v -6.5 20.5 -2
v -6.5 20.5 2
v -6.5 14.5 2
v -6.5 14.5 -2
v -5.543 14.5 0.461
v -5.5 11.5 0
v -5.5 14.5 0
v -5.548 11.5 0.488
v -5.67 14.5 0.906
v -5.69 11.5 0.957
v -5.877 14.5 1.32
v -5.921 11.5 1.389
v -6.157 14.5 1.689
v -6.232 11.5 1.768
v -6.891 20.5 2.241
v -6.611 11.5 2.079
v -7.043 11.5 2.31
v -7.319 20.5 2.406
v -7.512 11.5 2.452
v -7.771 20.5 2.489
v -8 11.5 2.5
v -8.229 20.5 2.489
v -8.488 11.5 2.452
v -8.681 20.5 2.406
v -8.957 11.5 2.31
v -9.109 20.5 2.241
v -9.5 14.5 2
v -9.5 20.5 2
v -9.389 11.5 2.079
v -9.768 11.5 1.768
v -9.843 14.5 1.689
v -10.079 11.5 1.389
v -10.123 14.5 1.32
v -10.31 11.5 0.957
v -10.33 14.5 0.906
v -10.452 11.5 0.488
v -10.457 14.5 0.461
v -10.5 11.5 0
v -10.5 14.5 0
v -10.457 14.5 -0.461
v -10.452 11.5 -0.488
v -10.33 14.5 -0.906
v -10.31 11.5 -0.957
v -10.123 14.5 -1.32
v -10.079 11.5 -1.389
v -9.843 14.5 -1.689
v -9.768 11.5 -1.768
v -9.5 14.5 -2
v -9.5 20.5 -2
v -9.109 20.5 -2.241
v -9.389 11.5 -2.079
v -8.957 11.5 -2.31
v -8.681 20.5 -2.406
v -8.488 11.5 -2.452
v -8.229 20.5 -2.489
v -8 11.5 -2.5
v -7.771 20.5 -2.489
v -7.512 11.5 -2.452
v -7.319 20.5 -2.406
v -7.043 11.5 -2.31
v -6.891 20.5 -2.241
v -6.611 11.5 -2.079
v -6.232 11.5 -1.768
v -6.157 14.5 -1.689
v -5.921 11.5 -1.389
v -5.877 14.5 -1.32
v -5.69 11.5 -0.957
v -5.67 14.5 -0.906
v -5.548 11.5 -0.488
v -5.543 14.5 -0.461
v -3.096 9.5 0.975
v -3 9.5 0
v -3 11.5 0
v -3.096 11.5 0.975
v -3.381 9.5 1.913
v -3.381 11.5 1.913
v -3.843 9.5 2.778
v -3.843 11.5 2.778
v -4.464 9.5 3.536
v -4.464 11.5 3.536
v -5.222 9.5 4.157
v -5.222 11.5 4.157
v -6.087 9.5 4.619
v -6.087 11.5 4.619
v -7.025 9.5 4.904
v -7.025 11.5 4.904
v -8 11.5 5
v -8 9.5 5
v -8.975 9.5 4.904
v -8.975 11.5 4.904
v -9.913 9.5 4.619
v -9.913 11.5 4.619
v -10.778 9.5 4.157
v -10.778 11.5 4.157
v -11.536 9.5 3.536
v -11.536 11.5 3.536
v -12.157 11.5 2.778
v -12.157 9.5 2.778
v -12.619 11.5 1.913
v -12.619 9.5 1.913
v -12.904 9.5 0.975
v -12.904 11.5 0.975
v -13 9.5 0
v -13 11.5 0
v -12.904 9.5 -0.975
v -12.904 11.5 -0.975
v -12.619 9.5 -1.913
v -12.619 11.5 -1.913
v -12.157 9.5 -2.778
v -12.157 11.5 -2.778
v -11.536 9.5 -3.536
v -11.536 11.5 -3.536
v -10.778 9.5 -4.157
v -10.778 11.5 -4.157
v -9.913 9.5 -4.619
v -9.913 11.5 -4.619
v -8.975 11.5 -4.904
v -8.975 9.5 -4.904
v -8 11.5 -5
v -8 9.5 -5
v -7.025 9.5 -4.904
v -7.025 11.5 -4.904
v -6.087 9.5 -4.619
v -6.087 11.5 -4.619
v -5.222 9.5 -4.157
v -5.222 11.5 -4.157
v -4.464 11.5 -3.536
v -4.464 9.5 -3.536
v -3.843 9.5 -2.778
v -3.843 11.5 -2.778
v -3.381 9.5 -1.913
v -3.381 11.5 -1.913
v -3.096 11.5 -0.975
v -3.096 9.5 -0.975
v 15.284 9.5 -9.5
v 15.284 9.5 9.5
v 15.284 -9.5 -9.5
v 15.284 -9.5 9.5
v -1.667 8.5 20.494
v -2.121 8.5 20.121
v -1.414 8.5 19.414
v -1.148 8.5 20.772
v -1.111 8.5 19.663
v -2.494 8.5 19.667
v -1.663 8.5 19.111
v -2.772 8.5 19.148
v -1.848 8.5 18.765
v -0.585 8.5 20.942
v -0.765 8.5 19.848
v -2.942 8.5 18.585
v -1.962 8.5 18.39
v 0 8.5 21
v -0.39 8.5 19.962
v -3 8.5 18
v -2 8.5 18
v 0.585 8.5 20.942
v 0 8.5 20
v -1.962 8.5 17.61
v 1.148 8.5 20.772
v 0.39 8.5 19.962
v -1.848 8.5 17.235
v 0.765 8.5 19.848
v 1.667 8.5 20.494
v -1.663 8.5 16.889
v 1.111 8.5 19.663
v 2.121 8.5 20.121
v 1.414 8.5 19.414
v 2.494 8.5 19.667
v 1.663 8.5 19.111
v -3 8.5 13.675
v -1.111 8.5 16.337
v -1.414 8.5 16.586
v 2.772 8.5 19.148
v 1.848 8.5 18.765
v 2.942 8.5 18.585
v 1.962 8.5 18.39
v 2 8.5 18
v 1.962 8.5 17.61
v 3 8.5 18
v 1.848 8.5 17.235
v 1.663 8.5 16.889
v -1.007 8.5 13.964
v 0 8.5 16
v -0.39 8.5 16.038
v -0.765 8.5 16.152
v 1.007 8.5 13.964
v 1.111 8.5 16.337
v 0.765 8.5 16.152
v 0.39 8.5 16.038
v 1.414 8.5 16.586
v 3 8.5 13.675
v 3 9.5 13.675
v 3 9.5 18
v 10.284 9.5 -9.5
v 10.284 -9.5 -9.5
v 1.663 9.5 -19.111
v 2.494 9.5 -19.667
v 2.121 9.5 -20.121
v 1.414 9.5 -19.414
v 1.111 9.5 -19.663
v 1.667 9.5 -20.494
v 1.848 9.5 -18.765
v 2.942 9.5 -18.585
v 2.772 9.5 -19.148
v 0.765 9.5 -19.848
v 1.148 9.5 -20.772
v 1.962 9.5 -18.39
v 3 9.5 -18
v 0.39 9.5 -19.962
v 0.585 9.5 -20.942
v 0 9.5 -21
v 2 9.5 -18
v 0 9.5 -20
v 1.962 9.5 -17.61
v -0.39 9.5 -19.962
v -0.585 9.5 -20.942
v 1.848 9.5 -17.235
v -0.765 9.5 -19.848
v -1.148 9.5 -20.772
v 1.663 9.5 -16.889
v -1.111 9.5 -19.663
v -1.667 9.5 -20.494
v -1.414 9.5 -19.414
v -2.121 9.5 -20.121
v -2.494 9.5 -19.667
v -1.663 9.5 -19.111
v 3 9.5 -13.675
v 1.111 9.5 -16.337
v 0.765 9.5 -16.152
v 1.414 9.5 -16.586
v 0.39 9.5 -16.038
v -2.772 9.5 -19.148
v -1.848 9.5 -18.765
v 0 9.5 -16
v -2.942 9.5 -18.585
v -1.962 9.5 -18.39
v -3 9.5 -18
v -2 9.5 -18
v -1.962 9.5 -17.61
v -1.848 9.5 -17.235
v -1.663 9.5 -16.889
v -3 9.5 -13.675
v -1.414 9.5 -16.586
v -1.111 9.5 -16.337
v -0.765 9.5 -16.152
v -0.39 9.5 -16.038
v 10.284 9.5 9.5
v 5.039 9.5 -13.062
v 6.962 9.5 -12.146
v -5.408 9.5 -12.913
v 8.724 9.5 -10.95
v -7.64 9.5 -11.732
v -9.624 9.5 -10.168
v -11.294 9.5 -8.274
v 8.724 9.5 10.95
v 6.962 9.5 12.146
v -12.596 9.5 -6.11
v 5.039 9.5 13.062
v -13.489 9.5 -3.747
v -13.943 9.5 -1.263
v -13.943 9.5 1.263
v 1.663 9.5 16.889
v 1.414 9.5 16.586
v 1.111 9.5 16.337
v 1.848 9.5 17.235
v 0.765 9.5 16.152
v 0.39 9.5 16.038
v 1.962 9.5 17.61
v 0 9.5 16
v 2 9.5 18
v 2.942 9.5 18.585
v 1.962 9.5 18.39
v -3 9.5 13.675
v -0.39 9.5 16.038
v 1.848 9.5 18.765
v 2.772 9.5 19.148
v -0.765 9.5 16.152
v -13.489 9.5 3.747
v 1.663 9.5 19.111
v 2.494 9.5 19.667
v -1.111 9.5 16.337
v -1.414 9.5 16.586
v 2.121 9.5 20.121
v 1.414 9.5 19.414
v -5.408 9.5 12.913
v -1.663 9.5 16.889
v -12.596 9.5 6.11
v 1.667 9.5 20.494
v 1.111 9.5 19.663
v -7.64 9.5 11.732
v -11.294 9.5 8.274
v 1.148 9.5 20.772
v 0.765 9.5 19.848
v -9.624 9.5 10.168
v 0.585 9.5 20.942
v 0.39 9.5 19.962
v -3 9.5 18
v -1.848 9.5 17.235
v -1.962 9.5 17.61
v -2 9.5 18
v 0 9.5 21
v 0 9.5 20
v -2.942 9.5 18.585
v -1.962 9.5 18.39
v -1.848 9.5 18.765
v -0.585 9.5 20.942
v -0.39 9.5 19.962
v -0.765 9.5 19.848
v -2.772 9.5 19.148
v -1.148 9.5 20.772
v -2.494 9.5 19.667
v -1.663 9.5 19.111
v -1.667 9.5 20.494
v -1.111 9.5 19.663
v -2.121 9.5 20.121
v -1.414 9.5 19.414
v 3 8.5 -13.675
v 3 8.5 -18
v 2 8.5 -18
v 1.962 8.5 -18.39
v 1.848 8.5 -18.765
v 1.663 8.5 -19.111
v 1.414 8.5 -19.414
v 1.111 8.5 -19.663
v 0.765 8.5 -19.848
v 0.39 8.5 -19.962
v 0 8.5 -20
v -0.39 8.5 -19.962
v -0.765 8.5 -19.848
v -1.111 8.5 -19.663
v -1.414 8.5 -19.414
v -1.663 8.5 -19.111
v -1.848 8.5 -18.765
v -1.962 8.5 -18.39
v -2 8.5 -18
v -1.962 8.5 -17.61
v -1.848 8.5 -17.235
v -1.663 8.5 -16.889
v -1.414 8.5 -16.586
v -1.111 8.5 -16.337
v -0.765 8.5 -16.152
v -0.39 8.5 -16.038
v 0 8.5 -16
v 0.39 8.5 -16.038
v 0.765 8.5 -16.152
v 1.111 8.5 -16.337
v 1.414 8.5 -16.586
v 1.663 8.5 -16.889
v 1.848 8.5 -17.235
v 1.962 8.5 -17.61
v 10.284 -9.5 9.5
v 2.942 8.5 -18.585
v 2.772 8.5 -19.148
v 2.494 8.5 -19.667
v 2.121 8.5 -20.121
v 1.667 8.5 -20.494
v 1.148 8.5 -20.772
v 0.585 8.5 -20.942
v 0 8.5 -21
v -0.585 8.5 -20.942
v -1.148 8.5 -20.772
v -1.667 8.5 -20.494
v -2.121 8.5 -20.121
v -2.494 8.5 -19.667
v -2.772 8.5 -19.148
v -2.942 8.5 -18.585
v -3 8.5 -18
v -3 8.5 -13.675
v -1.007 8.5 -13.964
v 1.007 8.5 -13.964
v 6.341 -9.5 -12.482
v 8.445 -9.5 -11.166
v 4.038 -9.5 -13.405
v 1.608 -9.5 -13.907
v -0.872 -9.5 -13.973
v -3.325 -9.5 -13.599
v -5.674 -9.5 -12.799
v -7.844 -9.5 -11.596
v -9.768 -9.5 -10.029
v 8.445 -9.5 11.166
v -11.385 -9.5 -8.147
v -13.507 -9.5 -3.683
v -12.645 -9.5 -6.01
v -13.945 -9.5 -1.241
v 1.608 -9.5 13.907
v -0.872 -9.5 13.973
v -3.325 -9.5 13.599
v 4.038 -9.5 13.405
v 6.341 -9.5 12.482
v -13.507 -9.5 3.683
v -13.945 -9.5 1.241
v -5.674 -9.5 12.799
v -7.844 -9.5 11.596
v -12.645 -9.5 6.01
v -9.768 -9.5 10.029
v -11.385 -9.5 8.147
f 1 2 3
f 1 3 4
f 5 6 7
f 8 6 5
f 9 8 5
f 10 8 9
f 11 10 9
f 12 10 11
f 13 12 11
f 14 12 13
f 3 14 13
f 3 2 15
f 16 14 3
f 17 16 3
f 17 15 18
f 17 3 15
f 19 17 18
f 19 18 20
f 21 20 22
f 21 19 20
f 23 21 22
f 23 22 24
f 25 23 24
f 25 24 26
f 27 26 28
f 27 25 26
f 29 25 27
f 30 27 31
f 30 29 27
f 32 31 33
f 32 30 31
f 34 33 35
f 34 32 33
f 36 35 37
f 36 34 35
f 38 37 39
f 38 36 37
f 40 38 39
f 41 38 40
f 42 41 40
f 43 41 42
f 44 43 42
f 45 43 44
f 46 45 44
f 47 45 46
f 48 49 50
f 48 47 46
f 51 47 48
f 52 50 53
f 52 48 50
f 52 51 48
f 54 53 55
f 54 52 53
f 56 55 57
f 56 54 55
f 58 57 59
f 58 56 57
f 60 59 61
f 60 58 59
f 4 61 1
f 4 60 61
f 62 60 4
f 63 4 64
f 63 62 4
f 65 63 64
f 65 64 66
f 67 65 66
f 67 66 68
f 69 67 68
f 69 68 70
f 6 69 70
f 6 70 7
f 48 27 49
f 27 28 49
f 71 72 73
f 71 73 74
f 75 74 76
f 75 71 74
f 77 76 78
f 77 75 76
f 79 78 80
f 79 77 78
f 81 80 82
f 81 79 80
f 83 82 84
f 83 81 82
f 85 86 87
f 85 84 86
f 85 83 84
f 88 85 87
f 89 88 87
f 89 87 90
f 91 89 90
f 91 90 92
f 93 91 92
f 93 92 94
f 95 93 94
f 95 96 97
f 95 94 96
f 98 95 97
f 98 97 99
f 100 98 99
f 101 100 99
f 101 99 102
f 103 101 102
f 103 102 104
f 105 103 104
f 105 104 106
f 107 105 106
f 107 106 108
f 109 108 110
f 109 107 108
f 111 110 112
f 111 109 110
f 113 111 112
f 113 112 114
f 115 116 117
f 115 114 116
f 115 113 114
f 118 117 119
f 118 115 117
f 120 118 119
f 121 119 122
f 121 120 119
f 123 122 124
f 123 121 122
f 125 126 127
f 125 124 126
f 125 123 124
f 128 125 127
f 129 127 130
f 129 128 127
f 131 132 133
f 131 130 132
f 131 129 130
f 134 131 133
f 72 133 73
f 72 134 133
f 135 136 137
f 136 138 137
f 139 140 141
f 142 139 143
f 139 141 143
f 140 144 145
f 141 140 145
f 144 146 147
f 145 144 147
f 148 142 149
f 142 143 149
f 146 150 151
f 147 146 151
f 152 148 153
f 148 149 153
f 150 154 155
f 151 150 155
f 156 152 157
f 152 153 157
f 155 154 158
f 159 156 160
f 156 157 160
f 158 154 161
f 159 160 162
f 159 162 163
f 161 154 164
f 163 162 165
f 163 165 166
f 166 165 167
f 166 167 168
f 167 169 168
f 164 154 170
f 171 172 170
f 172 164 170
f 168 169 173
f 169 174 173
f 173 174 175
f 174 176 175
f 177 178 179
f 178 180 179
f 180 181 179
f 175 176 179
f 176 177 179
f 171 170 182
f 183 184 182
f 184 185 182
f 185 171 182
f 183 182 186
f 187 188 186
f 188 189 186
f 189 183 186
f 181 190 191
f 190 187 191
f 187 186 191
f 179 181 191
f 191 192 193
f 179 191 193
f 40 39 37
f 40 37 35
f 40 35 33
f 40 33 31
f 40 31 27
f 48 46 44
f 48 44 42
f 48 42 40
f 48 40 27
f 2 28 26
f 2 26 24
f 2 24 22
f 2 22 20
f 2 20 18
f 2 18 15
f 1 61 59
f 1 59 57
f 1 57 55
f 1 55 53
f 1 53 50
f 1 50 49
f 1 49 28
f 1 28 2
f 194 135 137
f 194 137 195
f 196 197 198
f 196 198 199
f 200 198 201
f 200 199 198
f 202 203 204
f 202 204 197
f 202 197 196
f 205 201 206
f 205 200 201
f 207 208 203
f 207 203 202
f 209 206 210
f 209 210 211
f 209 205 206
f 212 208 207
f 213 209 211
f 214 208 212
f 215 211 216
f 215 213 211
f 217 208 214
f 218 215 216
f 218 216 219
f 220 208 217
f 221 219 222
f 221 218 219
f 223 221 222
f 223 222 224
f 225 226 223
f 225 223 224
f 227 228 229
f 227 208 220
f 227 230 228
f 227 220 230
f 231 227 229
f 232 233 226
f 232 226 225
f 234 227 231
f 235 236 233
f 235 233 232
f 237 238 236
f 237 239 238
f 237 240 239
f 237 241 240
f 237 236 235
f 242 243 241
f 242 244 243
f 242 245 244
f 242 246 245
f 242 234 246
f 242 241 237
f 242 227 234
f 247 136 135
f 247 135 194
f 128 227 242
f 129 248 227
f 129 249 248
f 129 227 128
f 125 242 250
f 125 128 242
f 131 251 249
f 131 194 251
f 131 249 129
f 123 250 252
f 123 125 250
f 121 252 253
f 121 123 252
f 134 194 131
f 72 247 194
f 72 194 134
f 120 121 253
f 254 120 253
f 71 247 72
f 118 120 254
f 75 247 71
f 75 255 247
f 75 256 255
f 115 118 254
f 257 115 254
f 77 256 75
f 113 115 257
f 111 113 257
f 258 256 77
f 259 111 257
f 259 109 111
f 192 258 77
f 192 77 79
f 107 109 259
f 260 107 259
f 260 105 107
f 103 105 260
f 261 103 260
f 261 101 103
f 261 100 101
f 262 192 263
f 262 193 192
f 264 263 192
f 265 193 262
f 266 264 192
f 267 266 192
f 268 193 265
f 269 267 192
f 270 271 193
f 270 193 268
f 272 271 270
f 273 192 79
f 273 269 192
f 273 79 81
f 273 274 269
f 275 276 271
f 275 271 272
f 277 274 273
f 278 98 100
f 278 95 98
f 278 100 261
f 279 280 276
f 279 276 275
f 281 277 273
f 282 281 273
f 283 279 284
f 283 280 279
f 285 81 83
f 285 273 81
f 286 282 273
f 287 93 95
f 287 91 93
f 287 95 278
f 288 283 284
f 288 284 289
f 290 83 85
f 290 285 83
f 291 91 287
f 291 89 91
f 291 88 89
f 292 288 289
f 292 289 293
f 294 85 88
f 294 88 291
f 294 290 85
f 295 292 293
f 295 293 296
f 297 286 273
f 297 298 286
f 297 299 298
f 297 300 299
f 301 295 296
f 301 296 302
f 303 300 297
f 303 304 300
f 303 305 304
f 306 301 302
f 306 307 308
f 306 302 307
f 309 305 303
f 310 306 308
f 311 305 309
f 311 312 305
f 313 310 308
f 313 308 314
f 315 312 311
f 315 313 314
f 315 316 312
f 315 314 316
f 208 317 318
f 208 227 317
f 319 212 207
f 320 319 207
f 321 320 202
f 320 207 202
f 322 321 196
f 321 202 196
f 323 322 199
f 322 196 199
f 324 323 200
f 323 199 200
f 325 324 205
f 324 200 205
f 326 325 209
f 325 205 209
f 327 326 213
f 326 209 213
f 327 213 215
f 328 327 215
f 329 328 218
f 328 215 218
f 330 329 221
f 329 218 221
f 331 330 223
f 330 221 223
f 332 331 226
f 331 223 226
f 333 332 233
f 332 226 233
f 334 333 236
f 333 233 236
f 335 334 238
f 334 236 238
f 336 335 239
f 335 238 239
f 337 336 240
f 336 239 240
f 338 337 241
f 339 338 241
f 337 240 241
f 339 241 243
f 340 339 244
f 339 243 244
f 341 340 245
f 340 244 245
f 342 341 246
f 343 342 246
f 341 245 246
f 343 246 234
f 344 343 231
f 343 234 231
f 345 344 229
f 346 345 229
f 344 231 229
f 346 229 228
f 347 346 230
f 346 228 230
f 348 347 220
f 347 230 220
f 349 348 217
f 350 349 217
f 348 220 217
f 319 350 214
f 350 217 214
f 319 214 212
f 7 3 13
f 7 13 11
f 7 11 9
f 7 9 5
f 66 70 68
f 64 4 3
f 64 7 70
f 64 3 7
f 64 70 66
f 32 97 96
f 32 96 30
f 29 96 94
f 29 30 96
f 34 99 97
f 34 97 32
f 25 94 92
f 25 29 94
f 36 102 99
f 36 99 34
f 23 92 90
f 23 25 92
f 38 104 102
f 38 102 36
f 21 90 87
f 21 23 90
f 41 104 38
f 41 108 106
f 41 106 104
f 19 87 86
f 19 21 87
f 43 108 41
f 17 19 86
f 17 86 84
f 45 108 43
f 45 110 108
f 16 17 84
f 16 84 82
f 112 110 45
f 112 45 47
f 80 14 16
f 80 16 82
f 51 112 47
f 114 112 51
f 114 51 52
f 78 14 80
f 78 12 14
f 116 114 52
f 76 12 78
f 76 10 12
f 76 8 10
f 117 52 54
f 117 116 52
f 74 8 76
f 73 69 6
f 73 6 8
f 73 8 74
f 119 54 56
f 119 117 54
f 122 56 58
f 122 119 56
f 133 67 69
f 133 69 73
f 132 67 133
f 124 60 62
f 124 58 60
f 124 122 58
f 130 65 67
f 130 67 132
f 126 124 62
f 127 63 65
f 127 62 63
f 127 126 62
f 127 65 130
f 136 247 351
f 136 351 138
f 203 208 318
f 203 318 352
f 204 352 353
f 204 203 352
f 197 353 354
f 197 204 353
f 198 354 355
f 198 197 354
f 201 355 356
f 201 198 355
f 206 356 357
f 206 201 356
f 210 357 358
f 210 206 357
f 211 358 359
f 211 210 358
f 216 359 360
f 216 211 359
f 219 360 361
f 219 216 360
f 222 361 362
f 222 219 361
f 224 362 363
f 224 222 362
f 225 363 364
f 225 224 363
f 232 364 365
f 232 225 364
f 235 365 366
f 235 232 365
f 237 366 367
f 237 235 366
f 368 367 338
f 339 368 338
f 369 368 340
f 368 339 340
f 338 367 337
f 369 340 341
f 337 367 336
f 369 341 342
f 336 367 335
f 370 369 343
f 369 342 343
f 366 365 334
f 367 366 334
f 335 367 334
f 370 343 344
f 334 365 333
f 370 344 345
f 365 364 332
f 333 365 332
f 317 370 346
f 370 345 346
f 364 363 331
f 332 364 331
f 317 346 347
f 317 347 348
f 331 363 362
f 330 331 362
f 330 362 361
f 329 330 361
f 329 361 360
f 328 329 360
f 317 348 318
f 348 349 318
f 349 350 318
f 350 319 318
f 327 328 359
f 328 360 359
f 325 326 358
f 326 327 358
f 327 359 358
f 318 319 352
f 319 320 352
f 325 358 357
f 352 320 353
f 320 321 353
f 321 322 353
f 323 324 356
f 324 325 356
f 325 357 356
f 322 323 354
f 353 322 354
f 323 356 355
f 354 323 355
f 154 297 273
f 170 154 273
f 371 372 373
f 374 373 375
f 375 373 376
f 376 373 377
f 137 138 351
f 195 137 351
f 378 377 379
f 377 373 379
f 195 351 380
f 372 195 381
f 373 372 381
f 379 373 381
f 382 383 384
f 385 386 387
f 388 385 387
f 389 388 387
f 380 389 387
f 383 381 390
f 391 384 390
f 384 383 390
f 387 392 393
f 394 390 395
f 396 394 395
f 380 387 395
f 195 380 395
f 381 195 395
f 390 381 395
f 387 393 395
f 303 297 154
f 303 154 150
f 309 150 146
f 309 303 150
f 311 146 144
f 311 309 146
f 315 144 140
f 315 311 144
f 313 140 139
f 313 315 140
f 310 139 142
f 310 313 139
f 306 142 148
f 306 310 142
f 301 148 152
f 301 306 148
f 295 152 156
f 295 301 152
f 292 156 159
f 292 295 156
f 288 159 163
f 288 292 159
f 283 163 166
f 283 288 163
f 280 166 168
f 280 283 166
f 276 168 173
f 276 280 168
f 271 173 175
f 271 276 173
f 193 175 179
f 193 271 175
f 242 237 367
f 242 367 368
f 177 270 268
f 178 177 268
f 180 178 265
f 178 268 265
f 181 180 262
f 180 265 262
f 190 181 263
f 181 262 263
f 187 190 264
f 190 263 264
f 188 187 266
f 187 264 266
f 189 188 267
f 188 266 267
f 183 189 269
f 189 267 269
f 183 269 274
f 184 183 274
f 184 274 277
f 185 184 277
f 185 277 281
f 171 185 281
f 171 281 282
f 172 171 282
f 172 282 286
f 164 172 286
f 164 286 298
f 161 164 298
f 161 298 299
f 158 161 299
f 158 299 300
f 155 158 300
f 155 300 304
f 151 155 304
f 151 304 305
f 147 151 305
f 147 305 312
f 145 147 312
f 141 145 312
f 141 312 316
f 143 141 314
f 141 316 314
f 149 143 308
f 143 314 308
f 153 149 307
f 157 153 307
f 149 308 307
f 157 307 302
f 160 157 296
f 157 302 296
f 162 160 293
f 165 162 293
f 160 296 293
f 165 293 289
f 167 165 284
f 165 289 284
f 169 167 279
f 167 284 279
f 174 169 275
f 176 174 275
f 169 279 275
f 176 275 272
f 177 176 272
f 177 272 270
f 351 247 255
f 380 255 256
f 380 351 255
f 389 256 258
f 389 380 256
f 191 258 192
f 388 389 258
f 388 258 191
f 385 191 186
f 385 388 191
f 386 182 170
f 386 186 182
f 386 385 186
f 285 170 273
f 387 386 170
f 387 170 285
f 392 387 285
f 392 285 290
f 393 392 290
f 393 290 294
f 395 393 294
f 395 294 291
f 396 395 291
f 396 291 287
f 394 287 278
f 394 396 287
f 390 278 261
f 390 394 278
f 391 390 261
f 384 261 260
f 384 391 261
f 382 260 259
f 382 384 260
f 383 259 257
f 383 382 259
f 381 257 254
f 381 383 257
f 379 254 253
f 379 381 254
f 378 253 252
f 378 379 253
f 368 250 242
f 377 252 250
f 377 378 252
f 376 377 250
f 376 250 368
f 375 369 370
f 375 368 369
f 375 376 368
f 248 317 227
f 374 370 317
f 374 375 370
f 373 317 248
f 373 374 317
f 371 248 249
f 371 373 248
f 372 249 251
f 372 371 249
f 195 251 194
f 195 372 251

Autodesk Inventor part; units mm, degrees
ref_plane "YZ Plane" through (0, 0, 0) normal (1, 0, 0) x (0, 1, 0)
ref_plane "XZ Plane" through (0, 0, 0) normal (0, 1, 0) x (-1, 0, 0)
ref_plane "XY Plane" through (0, 0, 0) normal (0, 0, 1) x (1, 0, 0)
sketch "Sketch1" plane through (0, 0, 0) normal (0, 1, 0) x (-1, 0, 0)
  circle A0 centre (0, 0) radius 14
  line L0 (-10.2835, 9.5) -> (-15.2835, 9.5)
  line L1 (-15.2835, 9.5) -> (-15.2835, -9.5)
  line L2 (-15.2835, -9.5) -> (-10.2835, -9.5)
  line L3 (-10.2835, -9.5) -> (-10.2835, 9.5)
  point P0 (-10.2835, 0)
  dimension "d0" = 28
  dimension "d3" = 5
  dimension "d4" = 19
extrude "Extrusion1" add sketch "Sketch1" along normal mid plane 19
sketch "Sketch2" plane through (0, 9.5, 0) normal (0, 1, 0) x (1, 0, 0)
  line L0 (0, 0) -> (15.2835, 0) construction
  line L1 (15.2835, -9.5) -> (15.2835, 9.5) projected
  circle A0 centre (0, 18) radius 2
  arc A1 (10.2835, 9.5) -> (10.2835, -9.5) centre (0, 0) ccw projected
  line L2 (-3, 13.6748) -> (3, 13.6748)
  line L3 (3, 13.6748) -> (3, 18)
  line L4 (3, 18) -> (-3, 18) construction
  line L5 (-3, 18) -> (-3, 13.6748)
  arc A2 (3, 18) -> (-3, 18) centre (0, 18) ccw
  circle A3 centre (0, -18) radius 2
  line L6 (-3, -13.6748) -> (3, -13.6748)
  line L7 (3, -13.6748) -> (3, -18)
  line L8 (3, -18) -> (-3, -18) construction
  line L9 (-3, -18) -> (-3, -13.6748)
  arc A4 (-3, -18) -> (3, -18) centre (0, -18) ccw
  point P0 (0, 14)
  point P1 (0, 13.6748)
  point P2 (0, -14)
  point P3 (0, -13.6748)
  dimension "d5" = 4
  dimension "d6" = 4
  dimension "d7" = 3
extrude "Extrusion2" add sketch "Sketch2" against normal blind 1 contours A1 L7 A4 L9 | A1 L5 A2 L3
sketch "Sketch3" plane through (0, 9.5, 0) normal (0, 1, 0) x (1, 0, 0)
  circle A0 centre (-8, 0) radius 5
  arc A1 (-3, 13.6748) -> (-3, -13.6748) centre (0, 0) ccw projected
  point P0 (-14, 0)
  point P1 (-14, 0)
  dimension "d10" = 10
  dimension "d11" = 6
extrude "Extrusion3" add sketch "Sketch3" along normal blind 2
sketch "Sketch4" plane through (-8, 11.5, 0) normal (0, 1, 0) x (1, 0, 0)
  circle A0 centre (0, 0) radius 2.5
  circle A1 centre (0, 0) radius 5 projected
  point P0 (8, 0)
  dimension "d14" = 5
extrude "Extrusion4" add sketch "Sketch4" along normal blind 9 contours A0
sketch "Sketch5" plane through (-8, 20.5, 0) normal (0, 1, 0) x (1, 0, 0)
  circle A0 centre (0, 0) radius 2.5 projected
  circle A1 centre (0, 0) radius 2.5 projected
  line L0 (1.5, -2) -> (1.5, 2)
  line L1 (0, -2.5) -> (0, 2.5) construction
  line L2 (-1.5, -2) -> (-1.5, 2)
  point P0 (8, 0)
  dimension "d19" = 3
extrude "Extrusion5" cut sketch "Sketch5" against normal blind 6 contours A0 L0 | L2 A0
properties part number "smol stepper"
